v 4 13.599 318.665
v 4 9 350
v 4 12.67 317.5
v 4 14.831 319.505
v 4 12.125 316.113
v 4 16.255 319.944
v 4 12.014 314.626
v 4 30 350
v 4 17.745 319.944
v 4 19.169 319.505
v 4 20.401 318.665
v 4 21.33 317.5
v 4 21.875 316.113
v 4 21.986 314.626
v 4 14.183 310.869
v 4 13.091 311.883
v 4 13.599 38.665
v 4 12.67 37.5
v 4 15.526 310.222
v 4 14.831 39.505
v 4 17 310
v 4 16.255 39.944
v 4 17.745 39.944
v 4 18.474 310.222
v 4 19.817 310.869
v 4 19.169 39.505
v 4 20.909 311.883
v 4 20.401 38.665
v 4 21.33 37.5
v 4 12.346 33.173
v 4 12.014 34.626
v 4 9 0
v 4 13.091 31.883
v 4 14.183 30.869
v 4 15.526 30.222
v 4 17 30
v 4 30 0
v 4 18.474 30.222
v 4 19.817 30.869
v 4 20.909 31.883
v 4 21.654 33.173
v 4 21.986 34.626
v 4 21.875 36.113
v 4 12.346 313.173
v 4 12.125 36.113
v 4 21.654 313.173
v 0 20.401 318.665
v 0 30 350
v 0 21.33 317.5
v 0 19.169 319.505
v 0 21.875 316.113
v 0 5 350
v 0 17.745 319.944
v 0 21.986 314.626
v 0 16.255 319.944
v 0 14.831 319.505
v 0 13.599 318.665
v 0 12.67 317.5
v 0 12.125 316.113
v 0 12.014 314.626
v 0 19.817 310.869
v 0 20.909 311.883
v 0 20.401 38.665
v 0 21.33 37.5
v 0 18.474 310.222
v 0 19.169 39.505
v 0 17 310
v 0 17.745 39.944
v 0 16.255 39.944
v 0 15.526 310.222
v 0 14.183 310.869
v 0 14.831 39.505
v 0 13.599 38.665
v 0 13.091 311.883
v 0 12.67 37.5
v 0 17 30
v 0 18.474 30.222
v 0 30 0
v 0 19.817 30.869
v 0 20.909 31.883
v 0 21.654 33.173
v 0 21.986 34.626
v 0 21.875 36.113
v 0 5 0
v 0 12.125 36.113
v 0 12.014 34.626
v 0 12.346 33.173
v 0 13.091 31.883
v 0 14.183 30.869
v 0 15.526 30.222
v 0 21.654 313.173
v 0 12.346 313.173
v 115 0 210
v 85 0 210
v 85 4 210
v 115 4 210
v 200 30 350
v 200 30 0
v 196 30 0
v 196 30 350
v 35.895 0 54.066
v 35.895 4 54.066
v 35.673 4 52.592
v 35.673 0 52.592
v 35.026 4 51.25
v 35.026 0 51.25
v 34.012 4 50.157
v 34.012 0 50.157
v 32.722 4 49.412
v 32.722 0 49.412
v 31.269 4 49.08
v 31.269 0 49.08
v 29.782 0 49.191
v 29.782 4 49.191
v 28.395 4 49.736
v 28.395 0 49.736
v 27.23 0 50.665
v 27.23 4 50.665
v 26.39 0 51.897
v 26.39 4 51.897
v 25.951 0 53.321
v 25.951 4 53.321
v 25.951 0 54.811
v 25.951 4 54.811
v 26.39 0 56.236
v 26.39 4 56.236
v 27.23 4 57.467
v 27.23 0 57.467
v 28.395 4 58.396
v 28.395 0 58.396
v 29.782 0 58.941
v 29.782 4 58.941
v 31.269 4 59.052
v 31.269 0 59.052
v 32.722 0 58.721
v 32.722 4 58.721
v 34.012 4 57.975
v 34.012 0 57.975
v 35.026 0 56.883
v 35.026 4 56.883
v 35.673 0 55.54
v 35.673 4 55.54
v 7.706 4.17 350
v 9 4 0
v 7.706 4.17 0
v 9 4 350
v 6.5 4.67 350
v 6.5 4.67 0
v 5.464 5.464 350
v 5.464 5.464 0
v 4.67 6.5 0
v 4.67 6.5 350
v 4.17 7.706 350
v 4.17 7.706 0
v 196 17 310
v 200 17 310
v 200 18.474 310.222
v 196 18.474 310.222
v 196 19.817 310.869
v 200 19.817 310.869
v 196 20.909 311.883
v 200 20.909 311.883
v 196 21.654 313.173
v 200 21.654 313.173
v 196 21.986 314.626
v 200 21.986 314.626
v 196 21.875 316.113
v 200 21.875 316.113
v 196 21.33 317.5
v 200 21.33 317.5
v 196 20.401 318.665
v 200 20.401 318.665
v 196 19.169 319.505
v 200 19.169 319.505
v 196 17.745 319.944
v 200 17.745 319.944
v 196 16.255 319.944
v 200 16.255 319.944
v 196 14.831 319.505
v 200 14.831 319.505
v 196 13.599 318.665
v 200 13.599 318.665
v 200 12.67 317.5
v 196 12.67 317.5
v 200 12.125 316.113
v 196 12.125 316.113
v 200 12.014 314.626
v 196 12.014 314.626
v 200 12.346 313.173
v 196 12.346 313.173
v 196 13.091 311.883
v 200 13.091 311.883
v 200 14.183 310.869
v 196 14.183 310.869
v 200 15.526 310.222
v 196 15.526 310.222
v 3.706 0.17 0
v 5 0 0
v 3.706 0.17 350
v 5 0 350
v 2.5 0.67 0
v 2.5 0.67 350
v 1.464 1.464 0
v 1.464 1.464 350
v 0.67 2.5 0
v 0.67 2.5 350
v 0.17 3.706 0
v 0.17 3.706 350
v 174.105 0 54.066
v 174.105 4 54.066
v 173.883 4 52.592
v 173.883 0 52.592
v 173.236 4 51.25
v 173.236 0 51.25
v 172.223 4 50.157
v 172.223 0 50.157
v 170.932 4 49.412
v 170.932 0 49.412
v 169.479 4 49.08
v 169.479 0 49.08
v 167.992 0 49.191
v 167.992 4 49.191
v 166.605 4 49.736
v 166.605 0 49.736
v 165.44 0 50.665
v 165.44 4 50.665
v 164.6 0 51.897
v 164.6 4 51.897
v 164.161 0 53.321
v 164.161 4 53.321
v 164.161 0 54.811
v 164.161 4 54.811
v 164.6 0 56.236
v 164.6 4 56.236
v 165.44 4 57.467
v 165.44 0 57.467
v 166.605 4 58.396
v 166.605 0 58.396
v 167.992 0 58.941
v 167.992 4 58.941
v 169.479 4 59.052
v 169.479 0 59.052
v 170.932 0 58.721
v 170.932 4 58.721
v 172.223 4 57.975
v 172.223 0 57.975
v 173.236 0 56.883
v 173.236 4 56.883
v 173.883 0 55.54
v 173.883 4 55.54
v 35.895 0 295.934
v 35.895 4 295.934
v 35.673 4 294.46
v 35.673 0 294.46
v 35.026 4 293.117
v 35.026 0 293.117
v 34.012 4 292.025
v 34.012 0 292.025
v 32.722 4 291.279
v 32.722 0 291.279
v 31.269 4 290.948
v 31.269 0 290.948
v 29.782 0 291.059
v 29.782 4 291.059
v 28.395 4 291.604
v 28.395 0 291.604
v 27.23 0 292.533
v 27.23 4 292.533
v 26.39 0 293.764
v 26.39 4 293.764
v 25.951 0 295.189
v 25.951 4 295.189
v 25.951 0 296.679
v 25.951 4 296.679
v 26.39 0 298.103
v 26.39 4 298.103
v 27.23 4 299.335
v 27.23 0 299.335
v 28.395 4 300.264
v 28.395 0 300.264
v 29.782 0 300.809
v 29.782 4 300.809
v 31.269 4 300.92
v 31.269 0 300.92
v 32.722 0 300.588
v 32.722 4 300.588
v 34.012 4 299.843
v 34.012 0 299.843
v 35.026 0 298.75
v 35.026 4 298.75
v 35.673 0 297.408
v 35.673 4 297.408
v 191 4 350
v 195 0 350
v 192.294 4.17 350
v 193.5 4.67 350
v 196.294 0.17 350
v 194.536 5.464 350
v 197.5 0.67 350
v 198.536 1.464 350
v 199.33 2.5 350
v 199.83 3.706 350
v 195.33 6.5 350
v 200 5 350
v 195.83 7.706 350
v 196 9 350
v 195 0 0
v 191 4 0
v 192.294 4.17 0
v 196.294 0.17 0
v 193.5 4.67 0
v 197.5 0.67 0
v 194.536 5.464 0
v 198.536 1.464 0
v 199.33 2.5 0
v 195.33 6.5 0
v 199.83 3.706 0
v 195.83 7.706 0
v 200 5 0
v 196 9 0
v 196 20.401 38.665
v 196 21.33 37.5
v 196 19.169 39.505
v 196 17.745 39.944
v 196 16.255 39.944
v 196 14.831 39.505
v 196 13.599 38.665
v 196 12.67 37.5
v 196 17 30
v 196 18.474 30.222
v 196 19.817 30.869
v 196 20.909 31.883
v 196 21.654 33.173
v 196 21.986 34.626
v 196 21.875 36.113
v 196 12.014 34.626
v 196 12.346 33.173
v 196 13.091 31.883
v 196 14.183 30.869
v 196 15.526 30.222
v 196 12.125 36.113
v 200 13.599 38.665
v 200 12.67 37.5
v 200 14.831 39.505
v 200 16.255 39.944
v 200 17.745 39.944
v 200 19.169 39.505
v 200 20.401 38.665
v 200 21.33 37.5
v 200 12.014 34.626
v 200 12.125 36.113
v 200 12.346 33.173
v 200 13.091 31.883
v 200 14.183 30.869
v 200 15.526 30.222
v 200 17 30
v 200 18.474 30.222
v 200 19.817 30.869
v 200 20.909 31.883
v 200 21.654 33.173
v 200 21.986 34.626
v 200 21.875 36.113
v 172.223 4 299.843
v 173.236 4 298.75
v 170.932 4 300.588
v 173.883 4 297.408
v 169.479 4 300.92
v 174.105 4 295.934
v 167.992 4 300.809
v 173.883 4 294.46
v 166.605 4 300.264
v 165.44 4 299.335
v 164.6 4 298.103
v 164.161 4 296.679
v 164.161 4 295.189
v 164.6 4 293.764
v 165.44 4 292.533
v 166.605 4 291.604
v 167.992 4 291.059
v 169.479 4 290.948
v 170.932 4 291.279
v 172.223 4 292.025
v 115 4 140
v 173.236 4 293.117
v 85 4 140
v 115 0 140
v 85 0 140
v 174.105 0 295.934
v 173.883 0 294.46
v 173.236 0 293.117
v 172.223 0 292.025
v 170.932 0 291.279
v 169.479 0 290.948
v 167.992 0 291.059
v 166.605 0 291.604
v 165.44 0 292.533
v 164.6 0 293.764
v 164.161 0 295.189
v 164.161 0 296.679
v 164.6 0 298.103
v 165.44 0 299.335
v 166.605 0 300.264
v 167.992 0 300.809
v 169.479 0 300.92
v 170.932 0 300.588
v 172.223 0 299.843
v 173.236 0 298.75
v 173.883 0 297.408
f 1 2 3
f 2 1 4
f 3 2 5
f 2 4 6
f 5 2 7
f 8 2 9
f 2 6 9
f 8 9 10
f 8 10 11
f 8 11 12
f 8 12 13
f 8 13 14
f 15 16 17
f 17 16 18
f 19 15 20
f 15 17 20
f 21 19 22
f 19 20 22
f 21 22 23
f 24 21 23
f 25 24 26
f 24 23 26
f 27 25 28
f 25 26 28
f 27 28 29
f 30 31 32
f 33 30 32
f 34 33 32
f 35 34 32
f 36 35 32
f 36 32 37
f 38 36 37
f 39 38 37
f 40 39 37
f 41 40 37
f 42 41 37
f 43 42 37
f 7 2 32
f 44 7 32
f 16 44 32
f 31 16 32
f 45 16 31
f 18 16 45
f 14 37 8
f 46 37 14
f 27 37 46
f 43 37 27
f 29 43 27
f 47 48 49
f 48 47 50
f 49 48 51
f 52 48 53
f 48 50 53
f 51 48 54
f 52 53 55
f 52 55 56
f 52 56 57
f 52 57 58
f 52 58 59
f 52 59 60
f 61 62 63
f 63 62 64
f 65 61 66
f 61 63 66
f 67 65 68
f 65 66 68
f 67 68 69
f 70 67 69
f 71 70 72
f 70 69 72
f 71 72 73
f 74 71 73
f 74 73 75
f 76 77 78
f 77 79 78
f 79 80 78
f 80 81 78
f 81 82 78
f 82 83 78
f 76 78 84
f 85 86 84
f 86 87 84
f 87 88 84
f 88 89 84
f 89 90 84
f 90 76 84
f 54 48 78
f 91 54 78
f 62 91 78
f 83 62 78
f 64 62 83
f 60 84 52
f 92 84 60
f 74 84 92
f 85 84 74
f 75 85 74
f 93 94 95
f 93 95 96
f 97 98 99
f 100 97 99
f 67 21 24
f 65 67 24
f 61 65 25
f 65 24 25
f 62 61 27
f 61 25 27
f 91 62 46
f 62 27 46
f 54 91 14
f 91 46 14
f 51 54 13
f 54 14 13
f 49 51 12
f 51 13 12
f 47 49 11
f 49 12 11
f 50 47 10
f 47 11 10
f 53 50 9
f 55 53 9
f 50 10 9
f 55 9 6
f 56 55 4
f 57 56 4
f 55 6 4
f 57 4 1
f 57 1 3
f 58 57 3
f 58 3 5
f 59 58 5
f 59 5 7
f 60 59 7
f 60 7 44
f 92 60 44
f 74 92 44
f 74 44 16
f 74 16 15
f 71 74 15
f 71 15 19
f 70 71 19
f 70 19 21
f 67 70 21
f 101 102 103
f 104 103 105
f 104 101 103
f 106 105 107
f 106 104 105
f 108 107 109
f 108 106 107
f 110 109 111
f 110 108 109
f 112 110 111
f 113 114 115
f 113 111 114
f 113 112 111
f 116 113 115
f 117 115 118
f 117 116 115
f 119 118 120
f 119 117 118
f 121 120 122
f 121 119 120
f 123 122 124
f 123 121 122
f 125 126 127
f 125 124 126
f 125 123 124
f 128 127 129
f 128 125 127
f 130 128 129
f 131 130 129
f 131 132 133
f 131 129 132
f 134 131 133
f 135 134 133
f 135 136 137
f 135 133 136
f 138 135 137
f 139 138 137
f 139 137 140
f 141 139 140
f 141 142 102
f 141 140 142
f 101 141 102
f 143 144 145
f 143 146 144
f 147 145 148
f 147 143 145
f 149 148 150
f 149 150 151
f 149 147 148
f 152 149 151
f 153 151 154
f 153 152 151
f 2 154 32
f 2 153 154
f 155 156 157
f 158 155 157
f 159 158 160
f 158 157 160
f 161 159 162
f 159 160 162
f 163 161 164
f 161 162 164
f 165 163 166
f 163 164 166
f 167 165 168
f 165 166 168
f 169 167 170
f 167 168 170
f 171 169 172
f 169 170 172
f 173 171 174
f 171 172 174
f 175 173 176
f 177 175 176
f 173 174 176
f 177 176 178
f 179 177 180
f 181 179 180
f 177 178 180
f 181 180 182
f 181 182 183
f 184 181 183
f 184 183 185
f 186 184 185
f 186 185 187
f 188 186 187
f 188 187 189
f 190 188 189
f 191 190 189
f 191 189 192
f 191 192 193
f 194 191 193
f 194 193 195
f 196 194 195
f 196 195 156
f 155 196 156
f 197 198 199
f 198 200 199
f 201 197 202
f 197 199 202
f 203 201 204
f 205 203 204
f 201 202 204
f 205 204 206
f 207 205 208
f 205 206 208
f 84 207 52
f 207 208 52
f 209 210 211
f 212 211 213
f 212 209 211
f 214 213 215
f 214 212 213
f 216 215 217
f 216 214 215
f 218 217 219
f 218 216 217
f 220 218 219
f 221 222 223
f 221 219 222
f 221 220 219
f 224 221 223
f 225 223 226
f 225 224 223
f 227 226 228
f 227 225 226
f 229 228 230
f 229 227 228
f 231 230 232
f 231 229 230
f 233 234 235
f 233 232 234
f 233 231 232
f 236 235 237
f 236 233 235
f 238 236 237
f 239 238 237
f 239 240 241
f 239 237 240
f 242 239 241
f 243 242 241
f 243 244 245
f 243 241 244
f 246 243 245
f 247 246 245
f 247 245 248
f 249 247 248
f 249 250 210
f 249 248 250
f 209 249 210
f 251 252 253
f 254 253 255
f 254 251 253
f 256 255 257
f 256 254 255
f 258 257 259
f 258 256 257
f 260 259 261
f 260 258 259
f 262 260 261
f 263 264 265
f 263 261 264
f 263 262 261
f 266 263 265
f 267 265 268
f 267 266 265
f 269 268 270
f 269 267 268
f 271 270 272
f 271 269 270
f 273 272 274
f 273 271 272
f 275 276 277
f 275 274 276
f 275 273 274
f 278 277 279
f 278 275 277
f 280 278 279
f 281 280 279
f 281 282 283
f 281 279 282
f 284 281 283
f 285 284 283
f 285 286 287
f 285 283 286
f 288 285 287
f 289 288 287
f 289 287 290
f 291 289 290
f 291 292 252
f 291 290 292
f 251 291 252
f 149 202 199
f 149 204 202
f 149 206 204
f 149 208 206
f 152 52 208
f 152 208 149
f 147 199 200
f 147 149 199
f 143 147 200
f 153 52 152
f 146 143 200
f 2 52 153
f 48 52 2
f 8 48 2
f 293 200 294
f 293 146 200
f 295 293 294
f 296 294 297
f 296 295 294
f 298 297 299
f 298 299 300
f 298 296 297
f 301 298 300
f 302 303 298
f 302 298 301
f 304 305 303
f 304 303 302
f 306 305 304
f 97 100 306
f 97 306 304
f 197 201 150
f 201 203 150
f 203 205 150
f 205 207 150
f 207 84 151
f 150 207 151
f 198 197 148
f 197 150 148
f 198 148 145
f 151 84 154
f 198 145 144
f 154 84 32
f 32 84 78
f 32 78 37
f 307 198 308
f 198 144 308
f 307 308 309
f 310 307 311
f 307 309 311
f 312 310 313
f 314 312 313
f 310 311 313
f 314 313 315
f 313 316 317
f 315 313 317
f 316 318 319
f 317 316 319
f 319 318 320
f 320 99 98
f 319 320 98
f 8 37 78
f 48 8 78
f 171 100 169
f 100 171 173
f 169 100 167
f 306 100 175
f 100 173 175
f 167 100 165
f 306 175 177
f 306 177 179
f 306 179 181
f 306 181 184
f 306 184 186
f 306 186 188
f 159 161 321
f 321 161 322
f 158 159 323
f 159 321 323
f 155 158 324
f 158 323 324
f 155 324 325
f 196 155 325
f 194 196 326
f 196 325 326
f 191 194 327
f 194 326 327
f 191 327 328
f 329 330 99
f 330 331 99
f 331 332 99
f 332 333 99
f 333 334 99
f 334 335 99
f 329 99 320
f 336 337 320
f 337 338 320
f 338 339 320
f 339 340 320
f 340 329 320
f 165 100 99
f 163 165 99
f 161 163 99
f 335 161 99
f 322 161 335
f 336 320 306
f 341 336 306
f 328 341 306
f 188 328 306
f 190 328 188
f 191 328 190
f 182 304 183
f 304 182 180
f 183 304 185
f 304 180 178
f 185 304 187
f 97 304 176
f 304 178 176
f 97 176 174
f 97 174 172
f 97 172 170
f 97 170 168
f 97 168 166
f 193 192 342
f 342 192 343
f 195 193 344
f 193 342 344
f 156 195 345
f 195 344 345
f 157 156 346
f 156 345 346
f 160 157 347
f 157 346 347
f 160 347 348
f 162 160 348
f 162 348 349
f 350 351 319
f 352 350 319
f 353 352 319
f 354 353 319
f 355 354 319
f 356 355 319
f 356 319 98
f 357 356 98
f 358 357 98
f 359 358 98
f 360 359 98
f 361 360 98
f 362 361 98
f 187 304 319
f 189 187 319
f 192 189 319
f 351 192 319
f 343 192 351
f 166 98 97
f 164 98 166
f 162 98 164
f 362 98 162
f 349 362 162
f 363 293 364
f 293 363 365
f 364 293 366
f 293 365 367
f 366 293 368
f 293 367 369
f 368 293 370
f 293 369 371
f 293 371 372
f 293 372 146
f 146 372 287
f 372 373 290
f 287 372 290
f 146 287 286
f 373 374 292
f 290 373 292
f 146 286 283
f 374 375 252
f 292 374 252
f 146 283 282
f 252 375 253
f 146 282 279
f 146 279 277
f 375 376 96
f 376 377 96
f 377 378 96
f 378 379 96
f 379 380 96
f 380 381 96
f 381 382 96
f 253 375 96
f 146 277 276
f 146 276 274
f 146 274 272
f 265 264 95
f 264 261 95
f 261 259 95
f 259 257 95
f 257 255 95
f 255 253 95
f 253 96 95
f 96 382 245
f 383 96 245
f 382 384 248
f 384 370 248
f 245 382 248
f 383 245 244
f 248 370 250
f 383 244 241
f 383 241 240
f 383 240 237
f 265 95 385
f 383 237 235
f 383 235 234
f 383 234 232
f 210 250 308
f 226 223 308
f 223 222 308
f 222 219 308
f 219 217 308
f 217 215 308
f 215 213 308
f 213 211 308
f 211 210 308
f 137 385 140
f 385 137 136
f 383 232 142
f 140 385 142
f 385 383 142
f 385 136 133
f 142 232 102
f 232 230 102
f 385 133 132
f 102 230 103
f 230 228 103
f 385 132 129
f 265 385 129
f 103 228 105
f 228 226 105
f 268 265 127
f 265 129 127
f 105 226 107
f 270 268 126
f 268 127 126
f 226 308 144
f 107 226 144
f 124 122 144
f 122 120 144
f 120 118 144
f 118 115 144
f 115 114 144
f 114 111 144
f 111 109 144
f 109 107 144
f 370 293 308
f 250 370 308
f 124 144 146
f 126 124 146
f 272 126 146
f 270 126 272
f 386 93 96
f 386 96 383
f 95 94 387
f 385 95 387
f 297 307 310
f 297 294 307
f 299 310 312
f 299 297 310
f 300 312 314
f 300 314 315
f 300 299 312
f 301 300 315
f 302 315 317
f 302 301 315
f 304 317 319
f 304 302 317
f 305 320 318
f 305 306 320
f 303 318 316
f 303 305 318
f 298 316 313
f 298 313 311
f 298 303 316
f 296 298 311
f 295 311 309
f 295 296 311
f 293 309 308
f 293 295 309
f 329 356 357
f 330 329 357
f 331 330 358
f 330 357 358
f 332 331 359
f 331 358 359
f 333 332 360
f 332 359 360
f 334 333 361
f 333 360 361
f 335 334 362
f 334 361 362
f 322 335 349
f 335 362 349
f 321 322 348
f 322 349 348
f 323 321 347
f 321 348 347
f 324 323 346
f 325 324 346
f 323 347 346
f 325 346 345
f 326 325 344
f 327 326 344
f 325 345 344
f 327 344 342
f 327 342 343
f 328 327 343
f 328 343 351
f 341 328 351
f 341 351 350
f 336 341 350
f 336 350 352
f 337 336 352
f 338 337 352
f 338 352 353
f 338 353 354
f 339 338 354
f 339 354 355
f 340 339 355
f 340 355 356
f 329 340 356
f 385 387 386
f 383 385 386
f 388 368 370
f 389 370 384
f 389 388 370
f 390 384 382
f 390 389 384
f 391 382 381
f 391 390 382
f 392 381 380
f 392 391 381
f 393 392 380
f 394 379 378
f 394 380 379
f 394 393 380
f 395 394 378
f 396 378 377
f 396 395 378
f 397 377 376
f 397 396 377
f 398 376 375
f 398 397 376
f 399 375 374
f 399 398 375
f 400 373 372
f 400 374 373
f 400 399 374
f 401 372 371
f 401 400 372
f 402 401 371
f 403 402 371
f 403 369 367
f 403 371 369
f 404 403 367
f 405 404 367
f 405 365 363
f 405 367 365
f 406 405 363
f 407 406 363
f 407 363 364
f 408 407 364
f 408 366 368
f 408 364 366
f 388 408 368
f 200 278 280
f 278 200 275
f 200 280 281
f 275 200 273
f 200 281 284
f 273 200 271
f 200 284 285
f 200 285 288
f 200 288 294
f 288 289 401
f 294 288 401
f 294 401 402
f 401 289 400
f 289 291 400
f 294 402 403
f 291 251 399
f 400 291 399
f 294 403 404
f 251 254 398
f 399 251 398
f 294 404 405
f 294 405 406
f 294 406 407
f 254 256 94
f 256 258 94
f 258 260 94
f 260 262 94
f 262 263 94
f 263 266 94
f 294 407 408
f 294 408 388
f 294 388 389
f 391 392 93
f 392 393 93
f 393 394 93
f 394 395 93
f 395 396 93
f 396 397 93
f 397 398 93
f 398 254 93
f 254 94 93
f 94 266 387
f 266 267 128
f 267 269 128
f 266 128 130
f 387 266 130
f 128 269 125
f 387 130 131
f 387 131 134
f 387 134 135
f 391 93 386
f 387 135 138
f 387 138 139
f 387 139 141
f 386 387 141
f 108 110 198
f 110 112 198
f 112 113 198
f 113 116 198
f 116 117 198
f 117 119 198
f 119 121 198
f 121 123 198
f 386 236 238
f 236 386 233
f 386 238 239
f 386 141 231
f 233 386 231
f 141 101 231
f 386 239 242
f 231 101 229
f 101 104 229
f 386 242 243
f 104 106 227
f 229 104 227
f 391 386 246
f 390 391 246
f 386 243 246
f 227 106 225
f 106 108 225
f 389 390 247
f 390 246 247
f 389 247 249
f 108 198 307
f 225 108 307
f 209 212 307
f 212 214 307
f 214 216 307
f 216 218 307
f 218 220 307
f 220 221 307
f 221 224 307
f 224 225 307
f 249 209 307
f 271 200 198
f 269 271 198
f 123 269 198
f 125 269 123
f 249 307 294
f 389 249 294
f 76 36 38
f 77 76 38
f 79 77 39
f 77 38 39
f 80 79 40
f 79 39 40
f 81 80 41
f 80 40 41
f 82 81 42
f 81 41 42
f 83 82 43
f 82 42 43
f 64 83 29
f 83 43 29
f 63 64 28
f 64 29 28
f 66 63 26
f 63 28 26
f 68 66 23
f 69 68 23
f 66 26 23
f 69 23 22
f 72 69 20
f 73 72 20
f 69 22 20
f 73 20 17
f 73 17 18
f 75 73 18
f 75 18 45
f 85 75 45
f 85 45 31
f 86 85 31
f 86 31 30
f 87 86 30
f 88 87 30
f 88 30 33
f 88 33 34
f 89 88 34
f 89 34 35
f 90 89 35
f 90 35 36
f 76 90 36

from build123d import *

# Parameters (mm, degrees)
BOSS_EXTRUDE1_DEPTH = 350
FILLET1_R           = 5
SKETCH2_R           = 5
CUT_EXTRUDE1_DEPTH  = 300
SKETCH3_R           = 5
SKETCH3_W           = 30
SKETCH3_H           = 70
CUT_EXTRUDE6_DEPTH  = 10


with BuildPart() as part:
    # Sketch1 → Boss-Extrude1 (new body)
    with BuildSketch(Plane.XY):
        Polygon((0, 0), (200, 0), (200, 30), (196, 30), (196, 4), (4, 4), (4, 30), (0, 30), align=None)
    extrude(amount=BOSS_EXTRUDE1_DEPTH)

    # Fillet1
    fillet1_edges = [part.edges().sort_by_distance(p)[0] for p in [
        (4, 4, 175),
        (196, 4, 175),
        (200, 0, 175),
        (0, 0, 175),
    ]]
    fillet(fillet1_edges, radius=FILLET1_R)

    # Sketch2 → Cut-Extrude1 (cut)
    with BuildSketch(Plane(origin=(200, 0, 0), x_dir=(0, 0, -1), z_dir=(1, 0, 0))):
        with Locations((-315, 17)):
            Circle(SKETCH2_R)
        with Locations((-35, 17)):
            Circle(SKETCH2_R)
    extrude(amount=-CUT_EXTRUDE1_DEPTH, mode=Mode.SUBTRACT)

    # Sketch3 → Cut-Extrude6 (cut)
    with BuildSketch(Plane(origin=(0, 0, 0), x_dir=(1, 0, 0), z_dir=(0, 1, 0))):
        with Locations((30.894933586, -54.066133776)):
            Circle(SKETCH3_R)
        with Locations((169.105066414, -54.066133776)):
            Circle(SKETCH3_R)
        with Locations((169.105066414, -295.933866224)):
            Circle(SKETCH3_R)
        with Locations((30.894933586, -295.933866224)):
            Circle(SKETCH3_R)
        with Locations((100, -175)):
            Rectangle(SKETCH3_W, SKETCH3_H)
    extrude(amount=CUT_EXTRUDE6_DEPTH, mode=Mode.SUBTRACT)


solid = part.part
